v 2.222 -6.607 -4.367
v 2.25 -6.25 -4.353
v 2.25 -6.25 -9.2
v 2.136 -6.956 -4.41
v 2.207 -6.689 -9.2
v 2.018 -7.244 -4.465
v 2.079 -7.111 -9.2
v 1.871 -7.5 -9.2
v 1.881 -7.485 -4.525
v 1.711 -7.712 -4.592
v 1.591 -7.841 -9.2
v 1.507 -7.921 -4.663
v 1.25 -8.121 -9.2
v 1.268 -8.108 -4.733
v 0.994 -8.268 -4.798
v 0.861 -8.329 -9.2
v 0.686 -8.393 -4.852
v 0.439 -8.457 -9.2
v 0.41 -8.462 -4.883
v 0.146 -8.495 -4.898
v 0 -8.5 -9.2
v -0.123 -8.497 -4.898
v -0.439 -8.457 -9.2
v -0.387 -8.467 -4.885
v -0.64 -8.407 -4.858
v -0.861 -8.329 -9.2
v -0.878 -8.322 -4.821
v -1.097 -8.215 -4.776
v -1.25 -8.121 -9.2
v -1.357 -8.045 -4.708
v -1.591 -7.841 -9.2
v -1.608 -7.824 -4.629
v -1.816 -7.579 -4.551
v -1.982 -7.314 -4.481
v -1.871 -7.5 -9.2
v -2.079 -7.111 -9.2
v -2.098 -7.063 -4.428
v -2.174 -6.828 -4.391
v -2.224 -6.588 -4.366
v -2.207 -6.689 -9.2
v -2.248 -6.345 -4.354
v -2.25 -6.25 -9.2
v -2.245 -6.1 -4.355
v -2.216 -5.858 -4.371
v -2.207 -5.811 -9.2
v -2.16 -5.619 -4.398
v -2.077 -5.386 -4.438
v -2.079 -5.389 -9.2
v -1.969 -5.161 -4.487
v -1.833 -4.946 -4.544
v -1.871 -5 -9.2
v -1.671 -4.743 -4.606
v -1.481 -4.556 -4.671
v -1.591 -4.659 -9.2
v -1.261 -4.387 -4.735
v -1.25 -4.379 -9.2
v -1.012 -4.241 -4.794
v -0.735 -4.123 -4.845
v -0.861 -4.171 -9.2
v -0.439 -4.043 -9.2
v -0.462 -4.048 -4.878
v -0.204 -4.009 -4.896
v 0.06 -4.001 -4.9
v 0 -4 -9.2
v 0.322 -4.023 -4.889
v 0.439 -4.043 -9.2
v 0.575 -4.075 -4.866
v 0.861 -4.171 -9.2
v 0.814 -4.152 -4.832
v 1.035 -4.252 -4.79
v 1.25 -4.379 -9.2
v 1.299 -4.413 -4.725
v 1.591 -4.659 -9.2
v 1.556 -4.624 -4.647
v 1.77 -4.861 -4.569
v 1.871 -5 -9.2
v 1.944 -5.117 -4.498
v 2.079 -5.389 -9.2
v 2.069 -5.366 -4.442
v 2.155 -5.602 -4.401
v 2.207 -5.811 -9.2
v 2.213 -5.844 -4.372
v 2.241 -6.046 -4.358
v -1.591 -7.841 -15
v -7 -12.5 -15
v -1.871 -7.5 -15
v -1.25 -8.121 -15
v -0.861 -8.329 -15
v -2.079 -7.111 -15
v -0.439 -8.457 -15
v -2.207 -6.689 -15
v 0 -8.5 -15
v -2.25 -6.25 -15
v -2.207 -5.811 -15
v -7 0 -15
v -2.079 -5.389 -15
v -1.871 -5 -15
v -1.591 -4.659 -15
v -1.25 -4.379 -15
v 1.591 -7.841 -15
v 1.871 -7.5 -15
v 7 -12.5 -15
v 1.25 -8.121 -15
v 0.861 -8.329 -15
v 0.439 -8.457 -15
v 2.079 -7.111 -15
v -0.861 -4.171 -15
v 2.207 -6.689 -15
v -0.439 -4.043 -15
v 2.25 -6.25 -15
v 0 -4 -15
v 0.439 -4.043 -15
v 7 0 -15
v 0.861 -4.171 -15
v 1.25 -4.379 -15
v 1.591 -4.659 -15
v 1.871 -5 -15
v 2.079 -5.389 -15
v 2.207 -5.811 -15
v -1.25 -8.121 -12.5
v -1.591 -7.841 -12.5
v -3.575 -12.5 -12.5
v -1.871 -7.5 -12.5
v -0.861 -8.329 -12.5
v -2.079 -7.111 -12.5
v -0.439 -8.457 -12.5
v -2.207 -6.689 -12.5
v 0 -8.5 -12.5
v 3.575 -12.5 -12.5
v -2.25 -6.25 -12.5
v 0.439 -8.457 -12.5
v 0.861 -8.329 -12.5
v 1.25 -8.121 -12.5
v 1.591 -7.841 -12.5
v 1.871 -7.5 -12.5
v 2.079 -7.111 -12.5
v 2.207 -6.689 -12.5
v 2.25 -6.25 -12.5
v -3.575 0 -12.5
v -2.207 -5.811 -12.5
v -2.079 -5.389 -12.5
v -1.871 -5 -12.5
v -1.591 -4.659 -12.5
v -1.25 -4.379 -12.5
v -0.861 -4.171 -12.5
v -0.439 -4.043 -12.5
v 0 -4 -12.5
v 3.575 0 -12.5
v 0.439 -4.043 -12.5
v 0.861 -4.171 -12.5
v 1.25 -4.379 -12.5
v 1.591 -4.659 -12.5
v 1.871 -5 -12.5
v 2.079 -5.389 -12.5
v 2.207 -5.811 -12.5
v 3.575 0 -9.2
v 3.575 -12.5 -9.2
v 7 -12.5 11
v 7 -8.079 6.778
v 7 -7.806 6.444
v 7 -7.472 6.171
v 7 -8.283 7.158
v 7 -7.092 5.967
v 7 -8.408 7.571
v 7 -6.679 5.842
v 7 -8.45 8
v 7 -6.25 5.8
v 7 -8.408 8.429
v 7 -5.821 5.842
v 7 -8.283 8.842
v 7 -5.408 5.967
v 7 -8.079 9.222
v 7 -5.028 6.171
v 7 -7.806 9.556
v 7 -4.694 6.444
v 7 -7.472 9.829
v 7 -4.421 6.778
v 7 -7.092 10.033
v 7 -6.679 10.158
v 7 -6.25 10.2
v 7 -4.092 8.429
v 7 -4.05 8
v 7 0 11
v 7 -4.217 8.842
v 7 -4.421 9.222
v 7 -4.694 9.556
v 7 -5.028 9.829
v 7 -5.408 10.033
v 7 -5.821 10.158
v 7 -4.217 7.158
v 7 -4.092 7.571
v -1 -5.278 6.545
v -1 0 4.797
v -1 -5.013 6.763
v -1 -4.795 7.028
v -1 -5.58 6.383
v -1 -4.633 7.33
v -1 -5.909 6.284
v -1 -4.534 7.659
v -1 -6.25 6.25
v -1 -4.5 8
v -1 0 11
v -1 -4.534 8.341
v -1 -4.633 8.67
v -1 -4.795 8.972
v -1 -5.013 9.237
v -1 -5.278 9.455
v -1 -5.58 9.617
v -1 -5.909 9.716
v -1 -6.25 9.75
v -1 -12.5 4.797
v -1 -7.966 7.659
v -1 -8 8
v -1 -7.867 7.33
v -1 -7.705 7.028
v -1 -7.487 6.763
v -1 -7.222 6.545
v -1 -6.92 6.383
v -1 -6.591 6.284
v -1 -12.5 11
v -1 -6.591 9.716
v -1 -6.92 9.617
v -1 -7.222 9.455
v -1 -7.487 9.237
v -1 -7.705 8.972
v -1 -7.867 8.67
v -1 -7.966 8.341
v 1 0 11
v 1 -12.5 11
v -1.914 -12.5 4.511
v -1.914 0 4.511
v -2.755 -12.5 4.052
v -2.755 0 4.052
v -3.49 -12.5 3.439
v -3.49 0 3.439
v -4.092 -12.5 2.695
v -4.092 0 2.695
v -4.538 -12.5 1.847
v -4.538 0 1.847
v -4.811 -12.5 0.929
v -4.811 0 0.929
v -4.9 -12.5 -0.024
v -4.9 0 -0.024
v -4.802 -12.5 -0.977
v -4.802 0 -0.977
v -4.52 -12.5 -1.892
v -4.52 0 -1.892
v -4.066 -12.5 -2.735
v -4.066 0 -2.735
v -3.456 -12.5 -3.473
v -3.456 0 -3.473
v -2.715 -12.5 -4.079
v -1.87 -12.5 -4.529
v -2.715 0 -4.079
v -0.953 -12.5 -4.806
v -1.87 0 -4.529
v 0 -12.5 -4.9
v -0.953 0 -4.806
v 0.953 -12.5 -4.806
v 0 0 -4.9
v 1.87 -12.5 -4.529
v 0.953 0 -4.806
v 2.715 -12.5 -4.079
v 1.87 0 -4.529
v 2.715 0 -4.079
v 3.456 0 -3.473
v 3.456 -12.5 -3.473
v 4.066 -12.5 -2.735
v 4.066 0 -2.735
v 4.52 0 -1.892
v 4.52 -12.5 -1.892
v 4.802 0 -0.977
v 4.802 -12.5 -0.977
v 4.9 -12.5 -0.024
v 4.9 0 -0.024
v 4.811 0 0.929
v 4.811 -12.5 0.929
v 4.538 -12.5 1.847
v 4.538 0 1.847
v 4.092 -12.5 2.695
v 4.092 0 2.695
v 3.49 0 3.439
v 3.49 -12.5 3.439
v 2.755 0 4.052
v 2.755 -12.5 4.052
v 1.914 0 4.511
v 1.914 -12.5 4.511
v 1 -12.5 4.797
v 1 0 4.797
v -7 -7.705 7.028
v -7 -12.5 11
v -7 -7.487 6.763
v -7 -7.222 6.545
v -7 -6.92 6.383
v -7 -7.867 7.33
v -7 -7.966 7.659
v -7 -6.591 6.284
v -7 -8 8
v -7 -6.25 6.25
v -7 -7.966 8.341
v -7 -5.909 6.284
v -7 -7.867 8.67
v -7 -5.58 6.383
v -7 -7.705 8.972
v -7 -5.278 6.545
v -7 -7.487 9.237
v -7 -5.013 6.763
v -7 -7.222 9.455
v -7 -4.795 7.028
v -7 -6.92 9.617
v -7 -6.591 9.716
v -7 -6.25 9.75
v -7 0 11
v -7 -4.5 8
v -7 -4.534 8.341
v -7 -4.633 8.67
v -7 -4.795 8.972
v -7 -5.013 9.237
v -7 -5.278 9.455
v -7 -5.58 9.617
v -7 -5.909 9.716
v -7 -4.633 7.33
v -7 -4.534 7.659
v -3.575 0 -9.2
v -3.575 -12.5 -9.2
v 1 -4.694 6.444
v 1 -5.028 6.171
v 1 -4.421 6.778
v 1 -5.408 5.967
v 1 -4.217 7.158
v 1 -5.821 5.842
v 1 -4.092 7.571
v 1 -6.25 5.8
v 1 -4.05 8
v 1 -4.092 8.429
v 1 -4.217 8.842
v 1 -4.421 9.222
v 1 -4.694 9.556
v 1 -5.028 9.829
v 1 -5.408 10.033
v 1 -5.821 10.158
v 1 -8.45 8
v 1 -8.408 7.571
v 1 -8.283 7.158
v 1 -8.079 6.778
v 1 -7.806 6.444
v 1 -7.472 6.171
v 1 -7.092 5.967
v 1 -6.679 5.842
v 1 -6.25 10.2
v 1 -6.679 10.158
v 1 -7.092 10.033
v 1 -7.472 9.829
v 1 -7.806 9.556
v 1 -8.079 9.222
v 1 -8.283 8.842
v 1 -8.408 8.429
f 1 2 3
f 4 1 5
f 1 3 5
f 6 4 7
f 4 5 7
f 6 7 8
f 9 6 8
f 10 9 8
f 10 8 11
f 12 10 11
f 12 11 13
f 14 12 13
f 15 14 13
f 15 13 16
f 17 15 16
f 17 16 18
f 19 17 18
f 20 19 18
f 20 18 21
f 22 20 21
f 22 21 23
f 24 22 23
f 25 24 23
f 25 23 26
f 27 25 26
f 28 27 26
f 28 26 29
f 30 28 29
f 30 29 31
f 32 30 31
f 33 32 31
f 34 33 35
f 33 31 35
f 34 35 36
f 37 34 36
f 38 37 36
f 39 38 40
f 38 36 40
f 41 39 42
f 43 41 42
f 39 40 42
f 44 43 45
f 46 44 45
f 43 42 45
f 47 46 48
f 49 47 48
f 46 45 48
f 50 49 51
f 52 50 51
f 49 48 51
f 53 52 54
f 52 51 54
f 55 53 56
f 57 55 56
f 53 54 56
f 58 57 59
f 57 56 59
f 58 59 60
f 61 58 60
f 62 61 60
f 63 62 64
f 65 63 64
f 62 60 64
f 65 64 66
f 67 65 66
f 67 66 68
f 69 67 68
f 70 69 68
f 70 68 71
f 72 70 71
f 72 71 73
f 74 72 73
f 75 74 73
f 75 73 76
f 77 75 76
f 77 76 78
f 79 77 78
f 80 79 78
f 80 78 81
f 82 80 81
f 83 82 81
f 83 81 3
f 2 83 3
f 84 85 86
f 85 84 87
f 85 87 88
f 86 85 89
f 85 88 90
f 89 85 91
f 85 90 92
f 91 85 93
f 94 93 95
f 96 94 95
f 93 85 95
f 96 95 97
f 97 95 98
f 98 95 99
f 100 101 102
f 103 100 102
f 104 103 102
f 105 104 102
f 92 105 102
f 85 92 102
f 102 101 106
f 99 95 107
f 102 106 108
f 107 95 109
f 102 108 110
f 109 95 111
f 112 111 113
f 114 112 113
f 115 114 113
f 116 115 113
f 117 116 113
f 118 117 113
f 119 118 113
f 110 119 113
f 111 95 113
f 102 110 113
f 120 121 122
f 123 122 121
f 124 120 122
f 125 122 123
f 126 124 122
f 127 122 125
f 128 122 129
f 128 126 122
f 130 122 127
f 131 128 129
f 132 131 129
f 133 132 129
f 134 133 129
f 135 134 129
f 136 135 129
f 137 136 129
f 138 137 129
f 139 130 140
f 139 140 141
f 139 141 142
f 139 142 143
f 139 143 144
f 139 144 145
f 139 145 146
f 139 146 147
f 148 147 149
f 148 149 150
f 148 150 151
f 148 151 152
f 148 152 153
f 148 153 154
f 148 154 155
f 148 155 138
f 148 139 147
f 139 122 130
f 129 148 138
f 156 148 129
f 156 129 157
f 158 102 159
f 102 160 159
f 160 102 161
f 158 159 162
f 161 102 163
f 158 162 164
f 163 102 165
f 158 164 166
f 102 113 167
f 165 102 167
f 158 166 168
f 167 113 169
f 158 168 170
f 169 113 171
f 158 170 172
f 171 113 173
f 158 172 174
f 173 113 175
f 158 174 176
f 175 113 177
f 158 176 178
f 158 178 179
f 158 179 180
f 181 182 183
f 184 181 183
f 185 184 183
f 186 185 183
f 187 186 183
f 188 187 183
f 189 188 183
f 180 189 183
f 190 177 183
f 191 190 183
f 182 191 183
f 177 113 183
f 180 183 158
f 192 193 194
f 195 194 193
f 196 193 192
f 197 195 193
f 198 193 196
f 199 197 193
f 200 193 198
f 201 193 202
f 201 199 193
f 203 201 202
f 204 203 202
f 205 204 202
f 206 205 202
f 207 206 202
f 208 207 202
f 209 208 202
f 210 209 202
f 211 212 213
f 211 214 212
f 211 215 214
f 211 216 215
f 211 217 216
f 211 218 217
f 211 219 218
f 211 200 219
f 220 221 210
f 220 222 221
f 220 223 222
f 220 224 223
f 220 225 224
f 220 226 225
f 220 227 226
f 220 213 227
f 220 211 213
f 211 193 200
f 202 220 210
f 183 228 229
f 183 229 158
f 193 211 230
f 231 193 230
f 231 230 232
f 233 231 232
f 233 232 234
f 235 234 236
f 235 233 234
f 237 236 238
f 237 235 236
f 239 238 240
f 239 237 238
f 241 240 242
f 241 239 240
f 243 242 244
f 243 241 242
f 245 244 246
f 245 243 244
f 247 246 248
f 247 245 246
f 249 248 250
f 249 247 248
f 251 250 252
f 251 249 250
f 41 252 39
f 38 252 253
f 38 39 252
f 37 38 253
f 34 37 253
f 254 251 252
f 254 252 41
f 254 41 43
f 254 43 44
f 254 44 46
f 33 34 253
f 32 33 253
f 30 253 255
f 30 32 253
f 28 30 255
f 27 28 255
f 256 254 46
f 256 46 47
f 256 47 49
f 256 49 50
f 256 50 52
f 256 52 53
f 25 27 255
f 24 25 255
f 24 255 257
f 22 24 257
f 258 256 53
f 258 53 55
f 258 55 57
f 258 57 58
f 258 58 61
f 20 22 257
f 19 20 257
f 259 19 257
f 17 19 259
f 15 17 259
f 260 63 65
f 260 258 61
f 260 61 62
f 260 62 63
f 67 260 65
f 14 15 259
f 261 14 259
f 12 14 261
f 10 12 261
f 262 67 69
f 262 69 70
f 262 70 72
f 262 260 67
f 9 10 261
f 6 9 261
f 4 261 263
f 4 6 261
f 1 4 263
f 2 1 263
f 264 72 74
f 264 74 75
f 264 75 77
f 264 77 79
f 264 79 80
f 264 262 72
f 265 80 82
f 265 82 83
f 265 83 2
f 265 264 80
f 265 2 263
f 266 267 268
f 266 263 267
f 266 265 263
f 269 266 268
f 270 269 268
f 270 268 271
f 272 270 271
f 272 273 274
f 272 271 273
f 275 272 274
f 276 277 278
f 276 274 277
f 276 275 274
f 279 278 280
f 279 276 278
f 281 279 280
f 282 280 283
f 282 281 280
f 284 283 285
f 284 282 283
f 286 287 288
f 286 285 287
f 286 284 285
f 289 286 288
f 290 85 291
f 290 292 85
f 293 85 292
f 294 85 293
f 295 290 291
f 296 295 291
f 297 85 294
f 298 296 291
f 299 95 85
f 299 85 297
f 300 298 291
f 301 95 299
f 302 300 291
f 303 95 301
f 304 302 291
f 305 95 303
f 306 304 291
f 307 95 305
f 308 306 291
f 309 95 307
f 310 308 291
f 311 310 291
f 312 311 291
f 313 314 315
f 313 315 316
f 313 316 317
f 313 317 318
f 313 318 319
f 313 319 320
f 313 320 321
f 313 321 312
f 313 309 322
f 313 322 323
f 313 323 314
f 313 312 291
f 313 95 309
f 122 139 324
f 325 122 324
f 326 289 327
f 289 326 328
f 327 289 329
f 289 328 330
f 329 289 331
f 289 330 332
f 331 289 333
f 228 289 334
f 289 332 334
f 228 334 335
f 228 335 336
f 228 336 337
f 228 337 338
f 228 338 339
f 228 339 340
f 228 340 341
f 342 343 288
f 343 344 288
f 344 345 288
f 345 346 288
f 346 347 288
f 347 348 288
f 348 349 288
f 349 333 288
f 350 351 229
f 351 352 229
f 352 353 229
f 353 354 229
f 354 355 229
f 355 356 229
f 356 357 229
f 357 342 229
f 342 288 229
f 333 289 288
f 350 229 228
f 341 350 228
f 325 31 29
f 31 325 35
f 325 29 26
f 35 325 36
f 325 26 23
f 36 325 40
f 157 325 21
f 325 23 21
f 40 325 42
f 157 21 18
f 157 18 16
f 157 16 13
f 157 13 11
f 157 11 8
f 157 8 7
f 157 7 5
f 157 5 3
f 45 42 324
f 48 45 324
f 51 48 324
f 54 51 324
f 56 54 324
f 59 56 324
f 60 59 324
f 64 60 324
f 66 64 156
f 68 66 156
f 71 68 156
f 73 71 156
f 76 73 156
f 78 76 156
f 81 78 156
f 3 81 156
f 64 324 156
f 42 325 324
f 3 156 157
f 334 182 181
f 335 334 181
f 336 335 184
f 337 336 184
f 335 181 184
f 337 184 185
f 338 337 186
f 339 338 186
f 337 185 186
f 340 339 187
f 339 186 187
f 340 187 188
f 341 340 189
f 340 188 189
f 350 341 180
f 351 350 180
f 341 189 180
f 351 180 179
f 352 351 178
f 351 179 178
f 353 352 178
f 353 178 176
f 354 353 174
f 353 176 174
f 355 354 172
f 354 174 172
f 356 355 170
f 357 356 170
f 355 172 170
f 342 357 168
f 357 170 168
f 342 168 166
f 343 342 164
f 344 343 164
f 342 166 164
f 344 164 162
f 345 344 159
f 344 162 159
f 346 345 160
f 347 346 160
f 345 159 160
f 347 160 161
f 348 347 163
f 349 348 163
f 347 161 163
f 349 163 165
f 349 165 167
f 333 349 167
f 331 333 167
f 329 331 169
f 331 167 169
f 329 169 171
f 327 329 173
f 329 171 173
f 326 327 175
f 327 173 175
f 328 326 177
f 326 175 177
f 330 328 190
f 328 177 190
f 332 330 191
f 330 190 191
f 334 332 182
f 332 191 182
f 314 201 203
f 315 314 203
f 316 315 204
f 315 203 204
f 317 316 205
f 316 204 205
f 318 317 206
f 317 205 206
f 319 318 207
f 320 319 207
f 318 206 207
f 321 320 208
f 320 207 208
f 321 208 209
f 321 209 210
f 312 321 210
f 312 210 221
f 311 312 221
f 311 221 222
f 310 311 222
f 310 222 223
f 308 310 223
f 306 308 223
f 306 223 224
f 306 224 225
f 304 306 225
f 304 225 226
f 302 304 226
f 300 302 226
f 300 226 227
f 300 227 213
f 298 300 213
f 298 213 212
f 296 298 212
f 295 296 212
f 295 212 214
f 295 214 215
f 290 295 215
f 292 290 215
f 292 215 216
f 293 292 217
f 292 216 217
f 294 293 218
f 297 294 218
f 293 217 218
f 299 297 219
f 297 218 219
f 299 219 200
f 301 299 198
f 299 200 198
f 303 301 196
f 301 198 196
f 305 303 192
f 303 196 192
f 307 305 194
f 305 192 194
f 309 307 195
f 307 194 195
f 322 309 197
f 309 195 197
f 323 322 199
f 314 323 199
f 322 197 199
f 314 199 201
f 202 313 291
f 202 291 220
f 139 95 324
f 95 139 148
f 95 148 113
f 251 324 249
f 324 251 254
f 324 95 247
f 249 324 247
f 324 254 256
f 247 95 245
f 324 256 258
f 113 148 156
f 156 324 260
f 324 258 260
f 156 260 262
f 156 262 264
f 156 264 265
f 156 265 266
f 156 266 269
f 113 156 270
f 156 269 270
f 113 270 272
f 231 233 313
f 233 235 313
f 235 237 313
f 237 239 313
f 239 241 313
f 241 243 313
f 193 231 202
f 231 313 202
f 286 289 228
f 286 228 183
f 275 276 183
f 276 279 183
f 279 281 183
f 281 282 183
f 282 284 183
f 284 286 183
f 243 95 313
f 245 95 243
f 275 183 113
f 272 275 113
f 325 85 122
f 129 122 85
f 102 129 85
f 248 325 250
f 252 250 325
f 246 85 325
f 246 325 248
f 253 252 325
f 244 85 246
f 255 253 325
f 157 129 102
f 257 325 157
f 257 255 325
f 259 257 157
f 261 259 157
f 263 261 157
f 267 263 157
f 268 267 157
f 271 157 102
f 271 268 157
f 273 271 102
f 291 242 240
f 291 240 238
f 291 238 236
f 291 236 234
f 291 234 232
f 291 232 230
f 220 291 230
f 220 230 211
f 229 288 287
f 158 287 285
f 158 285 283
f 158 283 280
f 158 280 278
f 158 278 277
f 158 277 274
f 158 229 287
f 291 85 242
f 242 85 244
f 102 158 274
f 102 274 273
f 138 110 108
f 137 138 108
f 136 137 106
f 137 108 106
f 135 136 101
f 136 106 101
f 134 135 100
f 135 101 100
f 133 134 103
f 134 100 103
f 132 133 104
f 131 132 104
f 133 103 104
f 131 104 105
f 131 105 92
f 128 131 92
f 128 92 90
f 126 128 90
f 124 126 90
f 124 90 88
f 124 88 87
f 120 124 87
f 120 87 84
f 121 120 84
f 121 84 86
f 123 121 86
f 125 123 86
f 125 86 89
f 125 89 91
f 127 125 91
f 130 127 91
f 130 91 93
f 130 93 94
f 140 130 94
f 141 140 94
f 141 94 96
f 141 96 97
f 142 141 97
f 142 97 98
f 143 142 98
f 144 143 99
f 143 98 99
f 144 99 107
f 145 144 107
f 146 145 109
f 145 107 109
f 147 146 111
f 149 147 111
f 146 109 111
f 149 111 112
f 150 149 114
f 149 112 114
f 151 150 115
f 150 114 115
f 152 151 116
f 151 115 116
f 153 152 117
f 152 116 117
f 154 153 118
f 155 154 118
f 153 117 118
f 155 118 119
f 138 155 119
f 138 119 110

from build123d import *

# Parameters (mm, degrees)
F0_W     = 14
F0_H     = 26
F0_W_2   = 7.15
F0_H_2   = 3.3
F0_R     = 4.9
F1_DEPTH = 12.5
F2_R     = 2.25
F3_DEPTH = 15
F4_W     = 2
F4_H     = 9.3737413222
F5_DEPTH = 12.5010001
F6_R     = 1.75
F7_DEPTH = 14.001
F8_R     = 2.2
F9_DEPTH = 6


with BuildPart() as f1:
    # F0 (on Front) → F1 (new body)
    with BuildSketch(Plane.XZ):
        with Locations((0, -2)):
            Rectangle(F0_W, F0_H)
        with Locations((0, -10.85)):
            Rectangle(F0_W_2, F0_H_2, mode=Mode.SUBTRACT)
        Circle(F0_R, mode=Mode.SUBTRACT)
    extrude(amount=F1_DEPTH)

    # F2 (on face) → F3 (cut)
    with BuildSketch(Plane(origin=(0, 0, -15), x_dir=(1, 0, 0), z_dir=(0, 0, -1))):
        with Locations((0, 6.25)):
            Circle(F2_R)
    extrude(amount=-F3_DEPTH, mode=Mode.SUBTRACT)

    # F4 (on face) → F5 (cut, through all)
    with BuildSketch(Plane.XZ.offset(12.5)):
        with Locations((0, 6.3131293389)):
            Rectangle(F4_W, F4_H)
    extrude(amount=-F5_DEPTH, mode=Mode.SUBTRACT)

    # F6 (on face) → F7 (cut, through all)
    with BuildSketch(Plane.YZ.offset(7)):
        with Locations((-6.25, 8)):
            Circle(F6_R)
    extrude(amount=-F7_DEPTH, mode=Mode.SUBTRACT)

    # F8 (on face) → F9 (cut)
    with BuildSketch(Plane.YZ.offset(7)):
        with Locations((-6.25, 8)):
            Circle(F8_R)
    extrude(amount=-F9_DEPTH, mode=Mode.SUBTRACT)


solid = f1.part
